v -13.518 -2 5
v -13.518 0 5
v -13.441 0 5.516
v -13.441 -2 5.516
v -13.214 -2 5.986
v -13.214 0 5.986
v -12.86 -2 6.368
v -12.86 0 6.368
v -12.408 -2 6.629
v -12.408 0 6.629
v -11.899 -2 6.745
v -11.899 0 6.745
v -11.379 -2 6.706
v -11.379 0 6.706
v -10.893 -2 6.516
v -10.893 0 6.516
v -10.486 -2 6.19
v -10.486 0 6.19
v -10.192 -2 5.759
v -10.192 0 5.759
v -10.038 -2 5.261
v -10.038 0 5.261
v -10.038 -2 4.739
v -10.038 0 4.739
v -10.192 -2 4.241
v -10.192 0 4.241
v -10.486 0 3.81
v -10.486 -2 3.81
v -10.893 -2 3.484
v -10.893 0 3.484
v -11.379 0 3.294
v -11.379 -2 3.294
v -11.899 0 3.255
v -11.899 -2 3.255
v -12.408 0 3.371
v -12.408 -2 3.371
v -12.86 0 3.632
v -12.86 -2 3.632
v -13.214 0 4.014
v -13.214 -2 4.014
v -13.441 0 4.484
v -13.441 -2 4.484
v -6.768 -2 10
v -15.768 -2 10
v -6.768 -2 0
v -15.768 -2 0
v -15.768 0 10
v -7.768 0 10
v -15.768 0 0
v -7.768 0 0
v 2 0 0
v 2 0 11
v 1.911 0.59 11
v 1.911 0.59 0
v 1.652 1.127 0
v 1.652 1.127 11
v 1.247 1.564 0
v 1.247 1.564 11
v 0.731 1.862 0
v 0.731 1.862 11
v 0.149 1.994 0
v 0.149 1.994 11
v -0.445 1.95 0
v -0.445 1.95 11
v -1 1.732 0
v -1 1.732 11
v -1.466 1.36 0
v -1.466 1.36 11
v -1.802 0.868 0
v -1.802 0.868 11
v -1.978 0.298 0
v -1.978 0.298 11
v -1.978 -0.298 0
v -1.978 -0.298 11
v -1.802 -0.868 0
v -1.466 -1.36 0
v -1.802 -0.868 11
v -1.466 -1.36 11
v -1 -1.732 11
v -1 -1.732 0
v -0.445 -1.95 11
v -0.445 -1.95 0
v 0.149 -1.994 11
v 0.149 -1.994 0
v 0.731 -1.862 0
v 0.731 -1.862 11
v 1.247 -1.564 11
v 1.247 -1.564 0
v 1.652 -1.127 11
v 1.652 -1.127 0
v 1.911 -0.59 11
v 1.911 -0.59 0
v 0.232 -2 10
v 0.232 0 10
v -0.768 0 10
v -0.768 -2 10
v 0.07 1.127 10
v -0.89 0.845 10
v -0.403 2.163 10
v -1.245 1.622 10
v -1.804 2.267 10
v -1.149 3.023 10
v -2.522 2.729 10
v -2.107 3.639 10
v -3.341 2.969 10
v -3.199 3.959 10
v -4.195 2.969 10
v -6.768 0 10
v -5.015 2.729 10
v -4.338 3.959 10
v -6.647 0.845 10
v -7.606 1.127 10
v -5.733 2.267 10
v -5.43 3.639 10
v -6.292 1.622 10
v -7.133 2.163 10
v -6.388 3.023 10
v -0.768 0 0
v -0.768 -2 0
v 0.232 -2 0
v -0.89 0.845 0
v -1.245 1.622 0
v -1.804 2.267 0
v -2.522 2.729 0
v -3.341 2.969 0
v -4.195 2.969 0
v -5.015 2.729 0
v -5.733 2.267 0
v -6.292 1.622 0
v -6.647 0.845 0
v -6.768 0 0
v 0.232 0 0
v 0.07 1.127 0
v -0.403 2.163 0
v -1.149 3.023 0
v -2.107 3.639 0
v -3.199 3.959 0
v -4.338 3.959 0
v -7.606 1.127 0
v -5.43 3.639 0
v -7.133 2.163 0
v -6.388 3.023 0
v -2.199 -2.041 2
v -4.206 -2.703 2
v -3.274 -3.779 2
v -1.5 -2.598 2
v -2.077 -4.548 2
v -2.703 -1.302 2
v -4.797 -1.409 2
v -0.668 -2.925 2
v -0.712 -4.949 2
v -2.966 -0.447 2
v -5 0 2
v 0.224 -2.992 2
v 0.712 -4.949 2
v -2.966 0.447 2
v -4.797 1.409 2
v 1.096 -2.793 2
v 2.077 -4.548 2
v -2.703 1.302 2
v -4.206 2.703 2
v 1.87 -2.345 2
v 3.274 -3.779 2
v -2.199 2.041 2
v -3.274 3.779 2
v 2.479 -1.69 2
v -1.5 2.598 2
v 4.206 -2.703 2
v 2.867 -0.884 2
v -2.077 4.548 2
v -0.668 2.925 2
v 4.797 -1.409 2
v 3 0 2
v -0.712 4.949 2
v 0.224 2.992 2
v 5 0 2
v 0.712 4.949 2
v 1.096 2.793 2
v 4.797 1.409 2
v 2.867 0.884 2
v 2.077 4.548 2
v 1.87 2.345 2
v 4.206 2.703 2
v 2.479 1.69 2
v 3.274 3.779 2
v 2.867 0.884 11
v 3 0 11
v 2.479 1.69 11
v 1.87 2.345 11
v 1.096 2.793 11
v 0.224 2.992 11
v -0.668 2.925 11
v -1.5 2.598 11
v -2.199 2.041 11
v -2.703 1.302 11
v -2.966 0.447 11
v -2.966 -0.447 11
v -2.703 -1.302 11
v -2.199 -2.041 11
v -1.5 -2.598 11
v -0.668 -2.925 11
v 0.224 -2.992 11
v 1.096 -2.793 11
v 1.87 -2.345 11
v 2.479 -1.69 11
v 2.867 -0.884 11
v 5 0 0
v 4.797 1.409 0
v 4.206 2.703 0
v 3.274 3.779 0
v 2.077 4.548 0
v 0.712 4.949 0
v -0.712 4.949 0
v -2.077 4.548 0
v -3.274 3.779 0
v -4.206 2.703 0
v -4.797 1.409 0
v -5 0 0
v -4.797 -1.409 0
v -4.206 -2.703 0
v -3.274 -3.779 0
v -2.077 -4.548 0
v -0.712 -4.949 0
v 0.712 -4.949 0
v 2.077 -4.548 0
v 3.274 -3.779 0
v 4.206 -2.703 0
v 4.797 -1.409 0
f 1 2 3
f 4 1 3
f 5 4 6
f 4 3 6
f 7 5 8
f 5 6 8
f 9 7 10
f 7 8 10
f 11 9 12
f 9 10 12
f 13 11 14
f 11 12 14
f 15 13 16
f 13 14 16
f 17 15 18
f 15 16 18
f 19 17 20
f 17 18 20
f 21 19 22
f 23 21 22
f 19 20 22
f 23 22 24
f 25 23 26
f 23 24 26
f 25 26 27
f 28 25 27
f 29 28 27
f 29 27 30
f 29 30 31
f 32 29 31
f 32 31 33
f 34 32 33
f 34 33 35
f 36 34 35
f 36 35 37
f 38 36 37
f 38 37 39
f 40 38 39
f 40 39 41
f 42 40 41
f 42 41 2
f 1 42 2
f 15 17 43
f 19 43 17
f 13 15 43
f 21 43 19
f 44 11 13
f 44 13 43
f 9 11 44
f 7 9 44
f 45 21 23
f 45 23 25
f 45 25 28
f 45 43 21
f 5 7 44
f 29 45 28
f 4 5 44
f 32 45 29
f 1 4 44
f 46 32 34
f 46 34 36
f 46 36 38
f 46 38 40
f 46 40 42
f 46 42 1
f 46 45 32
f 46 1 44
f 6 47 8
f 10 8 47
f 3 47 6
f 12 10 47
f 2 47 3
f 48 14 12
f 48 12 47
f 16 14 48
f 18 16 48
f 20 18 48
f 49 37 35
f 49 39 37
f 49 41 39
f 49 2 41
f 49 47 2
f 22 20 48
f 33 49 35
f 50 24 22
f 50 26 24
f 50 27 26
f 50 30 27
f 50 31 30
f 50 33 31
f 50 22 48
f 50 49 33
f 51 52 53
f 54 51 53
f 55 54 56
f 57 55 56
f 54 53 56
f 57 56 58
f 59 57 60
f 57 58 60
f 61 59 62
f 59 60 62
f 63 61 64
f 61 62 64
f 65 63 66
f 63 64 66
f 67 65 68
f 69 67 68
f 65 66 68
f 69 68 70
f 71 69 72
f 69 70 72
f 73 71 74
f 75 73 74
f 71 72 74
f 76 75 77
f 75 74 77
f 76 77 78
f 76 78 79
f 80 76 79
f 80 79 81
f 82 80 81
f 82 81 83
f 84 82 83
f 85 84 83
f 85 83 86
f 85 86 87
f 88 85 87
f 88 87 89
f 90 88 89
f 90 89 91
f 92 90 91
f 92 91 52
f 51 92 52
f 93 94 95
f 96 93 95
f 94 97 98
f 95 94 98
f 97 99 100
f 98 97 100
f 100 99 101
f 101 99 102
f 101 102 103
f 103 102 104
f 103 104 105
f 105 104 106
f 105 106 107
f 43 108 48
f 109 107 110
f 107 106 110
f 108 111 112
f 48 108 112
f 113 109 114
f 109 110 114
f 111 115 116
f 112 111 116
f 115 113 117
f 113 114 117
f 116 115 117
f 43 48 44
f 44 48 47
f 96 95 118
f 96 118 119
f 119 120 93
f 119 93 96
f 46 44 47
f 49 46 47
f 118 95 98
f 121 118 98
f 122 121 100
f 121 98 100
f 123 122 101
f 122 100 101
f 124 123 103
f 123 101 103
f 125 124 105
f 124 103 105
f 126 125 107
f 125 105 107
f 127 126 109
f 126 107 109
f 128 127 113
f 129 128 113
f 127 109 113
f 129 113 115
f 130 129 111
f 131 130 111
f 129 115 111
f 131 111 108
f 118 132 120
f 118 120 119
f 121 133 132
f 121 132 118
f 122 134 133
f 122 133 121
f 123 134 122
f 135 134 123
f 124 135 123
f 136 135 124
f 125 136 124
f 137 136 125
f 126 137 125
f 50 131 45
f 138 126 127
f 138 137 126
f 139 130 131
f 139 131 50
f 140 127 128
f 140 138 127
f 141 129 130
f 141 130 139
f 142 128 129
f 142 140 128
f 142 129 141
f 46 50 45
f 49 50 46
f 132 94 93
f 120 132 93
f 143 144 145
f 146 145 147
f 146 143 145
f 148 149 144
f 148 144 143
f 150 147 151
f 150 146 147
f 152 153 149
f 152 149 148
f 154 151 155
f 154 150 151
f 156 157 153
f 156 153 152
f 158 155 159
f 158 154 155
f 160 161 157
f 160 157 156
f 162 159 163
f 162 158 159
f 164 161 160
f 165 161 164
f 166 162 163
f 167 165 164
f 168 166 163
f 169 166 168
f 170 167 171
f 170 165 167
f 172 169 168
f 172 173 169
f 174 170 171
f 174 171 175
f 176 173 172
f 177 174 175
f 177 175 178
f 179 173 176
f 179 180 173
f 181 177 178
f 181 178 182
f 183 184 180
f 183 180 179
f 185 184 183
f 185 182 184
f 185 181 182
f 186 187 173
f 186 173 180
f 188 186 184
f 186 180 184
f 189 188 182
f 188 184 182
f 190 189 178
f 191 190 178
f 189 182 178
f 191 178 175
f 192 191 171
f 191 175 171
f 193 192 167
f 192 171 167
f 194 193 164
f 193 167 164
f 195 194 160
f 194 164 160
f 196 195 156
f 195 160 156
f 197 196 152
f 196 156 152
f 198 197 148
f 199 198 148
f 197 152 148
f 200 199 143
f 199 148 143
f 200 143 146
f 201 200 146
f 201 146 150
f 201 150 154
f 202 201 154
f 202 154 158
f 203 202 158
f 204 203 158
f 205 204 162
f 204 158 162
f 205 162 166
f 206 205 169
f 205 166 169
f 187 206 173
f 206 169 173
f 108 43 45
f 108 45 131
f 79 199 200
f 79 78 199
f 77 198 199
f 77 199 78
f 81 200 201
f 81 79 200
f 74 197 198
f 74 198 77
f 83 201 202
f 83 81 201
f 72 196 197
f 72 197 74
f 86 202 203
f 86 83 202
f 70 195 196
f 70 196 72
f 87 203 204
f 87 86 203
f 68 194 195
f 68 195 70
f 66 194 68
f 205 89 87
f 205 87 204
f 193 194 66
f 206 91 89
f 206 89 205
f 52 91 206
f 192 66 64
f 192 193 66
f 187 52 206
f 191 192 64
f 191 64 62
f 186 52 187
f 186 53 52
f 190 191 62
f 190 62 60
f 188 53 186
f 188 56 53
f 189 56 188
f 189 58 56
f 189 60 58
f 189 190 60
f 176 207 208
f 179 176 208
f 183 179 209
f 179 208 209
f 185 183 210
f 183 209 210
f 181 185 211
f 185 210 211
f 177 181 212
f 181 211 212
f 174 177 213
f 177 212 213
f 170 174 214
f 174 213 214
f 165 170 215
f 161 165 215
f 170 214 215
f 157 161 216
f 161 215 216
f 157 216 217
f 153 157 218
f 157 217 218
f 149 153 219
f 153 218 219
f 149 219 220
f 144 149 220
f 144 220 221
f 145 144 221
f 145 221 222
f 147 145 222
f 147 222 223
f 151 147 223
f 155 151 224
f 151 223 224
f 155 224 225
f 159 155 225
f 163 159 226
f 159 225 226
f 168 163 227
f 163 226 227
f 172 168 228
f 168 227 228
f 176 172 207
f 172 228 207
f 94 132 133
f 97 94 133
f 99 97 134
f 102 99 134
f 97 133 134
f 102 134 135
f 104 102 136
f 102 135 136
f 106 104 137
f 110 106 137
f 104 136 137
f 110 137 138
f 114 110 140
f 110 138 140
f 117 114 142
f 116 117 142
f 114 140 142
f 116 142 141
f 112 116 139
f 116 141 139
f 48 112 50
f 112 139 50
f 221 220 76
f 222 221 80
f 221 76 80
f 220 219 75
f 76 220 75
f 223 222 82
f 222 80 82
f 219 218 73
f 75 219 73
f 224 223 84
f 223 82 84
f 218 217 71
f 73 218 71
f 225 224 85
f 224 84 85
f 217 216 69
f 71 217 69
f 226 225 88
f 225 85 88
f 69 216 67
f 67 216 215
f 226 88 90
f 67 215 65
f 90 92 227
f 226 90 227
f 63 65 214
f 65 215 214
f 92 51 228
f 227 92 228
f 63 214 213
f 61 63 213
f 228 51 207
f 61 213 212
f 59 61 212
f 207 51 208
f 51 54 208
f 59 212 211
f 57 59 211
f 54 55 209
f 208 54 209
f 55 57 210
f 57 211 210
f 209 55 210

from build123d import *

# Parameters (mm, degrees)
SKETCH_R        = 5
PAD_DEPTH       = 2
SKETCH001_R     = 3
PAD001_DEPTH    = 9
SKETCH002_R     = 2
POCKET_DEPTH    = 11.001
PAD002_DEPTH    = 10
POCKET001_DEPTH = 10.001
SKETCH005_R     = 1.75
POCKET002_DEPTH = 2.001


with BuildPart() as body:
    # Sketch → Pad (new body)
    with BuildSketch(Plane.XY):
        Circle(SKETCH_R)
    extrude(amount=PAD_DEPTH)

    # Sketch001 (on Face3 of Pad) → Pad001 (join)
    with BuildSketch(Plane.XY.offset(2)):
        Circle(SKETCH001_R)
    extrude(amount=PAD001_DEPTH)

    # Sketch002 (on Face5 of Pad001) → Pocket (cut, through all)
    with BuildSketch(Plane.XY.offset(11)):
        Circle(SKETCH002_R)
    extrude(amount=-POCKET_DEPTH, mode=Mode.SUBTRACT)


with BuildPart() as body001:
    # Sketch003 → Pad002 (new body)
    with BuildSketch(Plane.XY):
        with BuildLine():
            Line((-15.768435, 0), (-7.768435, 0))
            ThreePointArc((0.231565, 0), (-3.768435, 4), (-7.768435, 0))
            Line((0.231565, 0), (0.231565, -2))
            Line((0.231565, -2), (-15.768435, -2))
            Line((-15.768435, -2), (-15.768435, 0))
        make_face()
    extrude(amount=PAD002_DEPTH)

    # Sketch004 (on Face7 of Pad002) → Pocket001 (cut, through all)
    with BuildSketch(Plane.XY.offset(10)):
        with BuildLine():
            ThreePointArc((-0.768435, -1.3e-05), (-3.768421, 3), (-6.768435, 1.5e-05))
            Line((-6.768435, -2), (-6.768435, 1.5e-05))
            Line((-0.768435, -2), (-6.768435, -2))
            Line((-0.768435, -1.3e-05), (-0.768435, -2))
        make_face()
    extrude(amount=-POCKET001_DEPTH, mode=Mode.SUBTRACT)

    # Sketch005 (on Face1 of Pocket001) → Pocket002 (cut, through all)
    with BuildSketch(Plane(origin=(0, 0, 0), x_dir=(-1, 0, 0), z_dir=(0, 1, 0))):
        with Locations((11.768435, 5)):
            Circle(SKETCH005_R)
    extrude(amount=-POCKET002_DEPTH, mode=Mode.SUBTRACT)


solid = Compound([body.part, body001.part])
